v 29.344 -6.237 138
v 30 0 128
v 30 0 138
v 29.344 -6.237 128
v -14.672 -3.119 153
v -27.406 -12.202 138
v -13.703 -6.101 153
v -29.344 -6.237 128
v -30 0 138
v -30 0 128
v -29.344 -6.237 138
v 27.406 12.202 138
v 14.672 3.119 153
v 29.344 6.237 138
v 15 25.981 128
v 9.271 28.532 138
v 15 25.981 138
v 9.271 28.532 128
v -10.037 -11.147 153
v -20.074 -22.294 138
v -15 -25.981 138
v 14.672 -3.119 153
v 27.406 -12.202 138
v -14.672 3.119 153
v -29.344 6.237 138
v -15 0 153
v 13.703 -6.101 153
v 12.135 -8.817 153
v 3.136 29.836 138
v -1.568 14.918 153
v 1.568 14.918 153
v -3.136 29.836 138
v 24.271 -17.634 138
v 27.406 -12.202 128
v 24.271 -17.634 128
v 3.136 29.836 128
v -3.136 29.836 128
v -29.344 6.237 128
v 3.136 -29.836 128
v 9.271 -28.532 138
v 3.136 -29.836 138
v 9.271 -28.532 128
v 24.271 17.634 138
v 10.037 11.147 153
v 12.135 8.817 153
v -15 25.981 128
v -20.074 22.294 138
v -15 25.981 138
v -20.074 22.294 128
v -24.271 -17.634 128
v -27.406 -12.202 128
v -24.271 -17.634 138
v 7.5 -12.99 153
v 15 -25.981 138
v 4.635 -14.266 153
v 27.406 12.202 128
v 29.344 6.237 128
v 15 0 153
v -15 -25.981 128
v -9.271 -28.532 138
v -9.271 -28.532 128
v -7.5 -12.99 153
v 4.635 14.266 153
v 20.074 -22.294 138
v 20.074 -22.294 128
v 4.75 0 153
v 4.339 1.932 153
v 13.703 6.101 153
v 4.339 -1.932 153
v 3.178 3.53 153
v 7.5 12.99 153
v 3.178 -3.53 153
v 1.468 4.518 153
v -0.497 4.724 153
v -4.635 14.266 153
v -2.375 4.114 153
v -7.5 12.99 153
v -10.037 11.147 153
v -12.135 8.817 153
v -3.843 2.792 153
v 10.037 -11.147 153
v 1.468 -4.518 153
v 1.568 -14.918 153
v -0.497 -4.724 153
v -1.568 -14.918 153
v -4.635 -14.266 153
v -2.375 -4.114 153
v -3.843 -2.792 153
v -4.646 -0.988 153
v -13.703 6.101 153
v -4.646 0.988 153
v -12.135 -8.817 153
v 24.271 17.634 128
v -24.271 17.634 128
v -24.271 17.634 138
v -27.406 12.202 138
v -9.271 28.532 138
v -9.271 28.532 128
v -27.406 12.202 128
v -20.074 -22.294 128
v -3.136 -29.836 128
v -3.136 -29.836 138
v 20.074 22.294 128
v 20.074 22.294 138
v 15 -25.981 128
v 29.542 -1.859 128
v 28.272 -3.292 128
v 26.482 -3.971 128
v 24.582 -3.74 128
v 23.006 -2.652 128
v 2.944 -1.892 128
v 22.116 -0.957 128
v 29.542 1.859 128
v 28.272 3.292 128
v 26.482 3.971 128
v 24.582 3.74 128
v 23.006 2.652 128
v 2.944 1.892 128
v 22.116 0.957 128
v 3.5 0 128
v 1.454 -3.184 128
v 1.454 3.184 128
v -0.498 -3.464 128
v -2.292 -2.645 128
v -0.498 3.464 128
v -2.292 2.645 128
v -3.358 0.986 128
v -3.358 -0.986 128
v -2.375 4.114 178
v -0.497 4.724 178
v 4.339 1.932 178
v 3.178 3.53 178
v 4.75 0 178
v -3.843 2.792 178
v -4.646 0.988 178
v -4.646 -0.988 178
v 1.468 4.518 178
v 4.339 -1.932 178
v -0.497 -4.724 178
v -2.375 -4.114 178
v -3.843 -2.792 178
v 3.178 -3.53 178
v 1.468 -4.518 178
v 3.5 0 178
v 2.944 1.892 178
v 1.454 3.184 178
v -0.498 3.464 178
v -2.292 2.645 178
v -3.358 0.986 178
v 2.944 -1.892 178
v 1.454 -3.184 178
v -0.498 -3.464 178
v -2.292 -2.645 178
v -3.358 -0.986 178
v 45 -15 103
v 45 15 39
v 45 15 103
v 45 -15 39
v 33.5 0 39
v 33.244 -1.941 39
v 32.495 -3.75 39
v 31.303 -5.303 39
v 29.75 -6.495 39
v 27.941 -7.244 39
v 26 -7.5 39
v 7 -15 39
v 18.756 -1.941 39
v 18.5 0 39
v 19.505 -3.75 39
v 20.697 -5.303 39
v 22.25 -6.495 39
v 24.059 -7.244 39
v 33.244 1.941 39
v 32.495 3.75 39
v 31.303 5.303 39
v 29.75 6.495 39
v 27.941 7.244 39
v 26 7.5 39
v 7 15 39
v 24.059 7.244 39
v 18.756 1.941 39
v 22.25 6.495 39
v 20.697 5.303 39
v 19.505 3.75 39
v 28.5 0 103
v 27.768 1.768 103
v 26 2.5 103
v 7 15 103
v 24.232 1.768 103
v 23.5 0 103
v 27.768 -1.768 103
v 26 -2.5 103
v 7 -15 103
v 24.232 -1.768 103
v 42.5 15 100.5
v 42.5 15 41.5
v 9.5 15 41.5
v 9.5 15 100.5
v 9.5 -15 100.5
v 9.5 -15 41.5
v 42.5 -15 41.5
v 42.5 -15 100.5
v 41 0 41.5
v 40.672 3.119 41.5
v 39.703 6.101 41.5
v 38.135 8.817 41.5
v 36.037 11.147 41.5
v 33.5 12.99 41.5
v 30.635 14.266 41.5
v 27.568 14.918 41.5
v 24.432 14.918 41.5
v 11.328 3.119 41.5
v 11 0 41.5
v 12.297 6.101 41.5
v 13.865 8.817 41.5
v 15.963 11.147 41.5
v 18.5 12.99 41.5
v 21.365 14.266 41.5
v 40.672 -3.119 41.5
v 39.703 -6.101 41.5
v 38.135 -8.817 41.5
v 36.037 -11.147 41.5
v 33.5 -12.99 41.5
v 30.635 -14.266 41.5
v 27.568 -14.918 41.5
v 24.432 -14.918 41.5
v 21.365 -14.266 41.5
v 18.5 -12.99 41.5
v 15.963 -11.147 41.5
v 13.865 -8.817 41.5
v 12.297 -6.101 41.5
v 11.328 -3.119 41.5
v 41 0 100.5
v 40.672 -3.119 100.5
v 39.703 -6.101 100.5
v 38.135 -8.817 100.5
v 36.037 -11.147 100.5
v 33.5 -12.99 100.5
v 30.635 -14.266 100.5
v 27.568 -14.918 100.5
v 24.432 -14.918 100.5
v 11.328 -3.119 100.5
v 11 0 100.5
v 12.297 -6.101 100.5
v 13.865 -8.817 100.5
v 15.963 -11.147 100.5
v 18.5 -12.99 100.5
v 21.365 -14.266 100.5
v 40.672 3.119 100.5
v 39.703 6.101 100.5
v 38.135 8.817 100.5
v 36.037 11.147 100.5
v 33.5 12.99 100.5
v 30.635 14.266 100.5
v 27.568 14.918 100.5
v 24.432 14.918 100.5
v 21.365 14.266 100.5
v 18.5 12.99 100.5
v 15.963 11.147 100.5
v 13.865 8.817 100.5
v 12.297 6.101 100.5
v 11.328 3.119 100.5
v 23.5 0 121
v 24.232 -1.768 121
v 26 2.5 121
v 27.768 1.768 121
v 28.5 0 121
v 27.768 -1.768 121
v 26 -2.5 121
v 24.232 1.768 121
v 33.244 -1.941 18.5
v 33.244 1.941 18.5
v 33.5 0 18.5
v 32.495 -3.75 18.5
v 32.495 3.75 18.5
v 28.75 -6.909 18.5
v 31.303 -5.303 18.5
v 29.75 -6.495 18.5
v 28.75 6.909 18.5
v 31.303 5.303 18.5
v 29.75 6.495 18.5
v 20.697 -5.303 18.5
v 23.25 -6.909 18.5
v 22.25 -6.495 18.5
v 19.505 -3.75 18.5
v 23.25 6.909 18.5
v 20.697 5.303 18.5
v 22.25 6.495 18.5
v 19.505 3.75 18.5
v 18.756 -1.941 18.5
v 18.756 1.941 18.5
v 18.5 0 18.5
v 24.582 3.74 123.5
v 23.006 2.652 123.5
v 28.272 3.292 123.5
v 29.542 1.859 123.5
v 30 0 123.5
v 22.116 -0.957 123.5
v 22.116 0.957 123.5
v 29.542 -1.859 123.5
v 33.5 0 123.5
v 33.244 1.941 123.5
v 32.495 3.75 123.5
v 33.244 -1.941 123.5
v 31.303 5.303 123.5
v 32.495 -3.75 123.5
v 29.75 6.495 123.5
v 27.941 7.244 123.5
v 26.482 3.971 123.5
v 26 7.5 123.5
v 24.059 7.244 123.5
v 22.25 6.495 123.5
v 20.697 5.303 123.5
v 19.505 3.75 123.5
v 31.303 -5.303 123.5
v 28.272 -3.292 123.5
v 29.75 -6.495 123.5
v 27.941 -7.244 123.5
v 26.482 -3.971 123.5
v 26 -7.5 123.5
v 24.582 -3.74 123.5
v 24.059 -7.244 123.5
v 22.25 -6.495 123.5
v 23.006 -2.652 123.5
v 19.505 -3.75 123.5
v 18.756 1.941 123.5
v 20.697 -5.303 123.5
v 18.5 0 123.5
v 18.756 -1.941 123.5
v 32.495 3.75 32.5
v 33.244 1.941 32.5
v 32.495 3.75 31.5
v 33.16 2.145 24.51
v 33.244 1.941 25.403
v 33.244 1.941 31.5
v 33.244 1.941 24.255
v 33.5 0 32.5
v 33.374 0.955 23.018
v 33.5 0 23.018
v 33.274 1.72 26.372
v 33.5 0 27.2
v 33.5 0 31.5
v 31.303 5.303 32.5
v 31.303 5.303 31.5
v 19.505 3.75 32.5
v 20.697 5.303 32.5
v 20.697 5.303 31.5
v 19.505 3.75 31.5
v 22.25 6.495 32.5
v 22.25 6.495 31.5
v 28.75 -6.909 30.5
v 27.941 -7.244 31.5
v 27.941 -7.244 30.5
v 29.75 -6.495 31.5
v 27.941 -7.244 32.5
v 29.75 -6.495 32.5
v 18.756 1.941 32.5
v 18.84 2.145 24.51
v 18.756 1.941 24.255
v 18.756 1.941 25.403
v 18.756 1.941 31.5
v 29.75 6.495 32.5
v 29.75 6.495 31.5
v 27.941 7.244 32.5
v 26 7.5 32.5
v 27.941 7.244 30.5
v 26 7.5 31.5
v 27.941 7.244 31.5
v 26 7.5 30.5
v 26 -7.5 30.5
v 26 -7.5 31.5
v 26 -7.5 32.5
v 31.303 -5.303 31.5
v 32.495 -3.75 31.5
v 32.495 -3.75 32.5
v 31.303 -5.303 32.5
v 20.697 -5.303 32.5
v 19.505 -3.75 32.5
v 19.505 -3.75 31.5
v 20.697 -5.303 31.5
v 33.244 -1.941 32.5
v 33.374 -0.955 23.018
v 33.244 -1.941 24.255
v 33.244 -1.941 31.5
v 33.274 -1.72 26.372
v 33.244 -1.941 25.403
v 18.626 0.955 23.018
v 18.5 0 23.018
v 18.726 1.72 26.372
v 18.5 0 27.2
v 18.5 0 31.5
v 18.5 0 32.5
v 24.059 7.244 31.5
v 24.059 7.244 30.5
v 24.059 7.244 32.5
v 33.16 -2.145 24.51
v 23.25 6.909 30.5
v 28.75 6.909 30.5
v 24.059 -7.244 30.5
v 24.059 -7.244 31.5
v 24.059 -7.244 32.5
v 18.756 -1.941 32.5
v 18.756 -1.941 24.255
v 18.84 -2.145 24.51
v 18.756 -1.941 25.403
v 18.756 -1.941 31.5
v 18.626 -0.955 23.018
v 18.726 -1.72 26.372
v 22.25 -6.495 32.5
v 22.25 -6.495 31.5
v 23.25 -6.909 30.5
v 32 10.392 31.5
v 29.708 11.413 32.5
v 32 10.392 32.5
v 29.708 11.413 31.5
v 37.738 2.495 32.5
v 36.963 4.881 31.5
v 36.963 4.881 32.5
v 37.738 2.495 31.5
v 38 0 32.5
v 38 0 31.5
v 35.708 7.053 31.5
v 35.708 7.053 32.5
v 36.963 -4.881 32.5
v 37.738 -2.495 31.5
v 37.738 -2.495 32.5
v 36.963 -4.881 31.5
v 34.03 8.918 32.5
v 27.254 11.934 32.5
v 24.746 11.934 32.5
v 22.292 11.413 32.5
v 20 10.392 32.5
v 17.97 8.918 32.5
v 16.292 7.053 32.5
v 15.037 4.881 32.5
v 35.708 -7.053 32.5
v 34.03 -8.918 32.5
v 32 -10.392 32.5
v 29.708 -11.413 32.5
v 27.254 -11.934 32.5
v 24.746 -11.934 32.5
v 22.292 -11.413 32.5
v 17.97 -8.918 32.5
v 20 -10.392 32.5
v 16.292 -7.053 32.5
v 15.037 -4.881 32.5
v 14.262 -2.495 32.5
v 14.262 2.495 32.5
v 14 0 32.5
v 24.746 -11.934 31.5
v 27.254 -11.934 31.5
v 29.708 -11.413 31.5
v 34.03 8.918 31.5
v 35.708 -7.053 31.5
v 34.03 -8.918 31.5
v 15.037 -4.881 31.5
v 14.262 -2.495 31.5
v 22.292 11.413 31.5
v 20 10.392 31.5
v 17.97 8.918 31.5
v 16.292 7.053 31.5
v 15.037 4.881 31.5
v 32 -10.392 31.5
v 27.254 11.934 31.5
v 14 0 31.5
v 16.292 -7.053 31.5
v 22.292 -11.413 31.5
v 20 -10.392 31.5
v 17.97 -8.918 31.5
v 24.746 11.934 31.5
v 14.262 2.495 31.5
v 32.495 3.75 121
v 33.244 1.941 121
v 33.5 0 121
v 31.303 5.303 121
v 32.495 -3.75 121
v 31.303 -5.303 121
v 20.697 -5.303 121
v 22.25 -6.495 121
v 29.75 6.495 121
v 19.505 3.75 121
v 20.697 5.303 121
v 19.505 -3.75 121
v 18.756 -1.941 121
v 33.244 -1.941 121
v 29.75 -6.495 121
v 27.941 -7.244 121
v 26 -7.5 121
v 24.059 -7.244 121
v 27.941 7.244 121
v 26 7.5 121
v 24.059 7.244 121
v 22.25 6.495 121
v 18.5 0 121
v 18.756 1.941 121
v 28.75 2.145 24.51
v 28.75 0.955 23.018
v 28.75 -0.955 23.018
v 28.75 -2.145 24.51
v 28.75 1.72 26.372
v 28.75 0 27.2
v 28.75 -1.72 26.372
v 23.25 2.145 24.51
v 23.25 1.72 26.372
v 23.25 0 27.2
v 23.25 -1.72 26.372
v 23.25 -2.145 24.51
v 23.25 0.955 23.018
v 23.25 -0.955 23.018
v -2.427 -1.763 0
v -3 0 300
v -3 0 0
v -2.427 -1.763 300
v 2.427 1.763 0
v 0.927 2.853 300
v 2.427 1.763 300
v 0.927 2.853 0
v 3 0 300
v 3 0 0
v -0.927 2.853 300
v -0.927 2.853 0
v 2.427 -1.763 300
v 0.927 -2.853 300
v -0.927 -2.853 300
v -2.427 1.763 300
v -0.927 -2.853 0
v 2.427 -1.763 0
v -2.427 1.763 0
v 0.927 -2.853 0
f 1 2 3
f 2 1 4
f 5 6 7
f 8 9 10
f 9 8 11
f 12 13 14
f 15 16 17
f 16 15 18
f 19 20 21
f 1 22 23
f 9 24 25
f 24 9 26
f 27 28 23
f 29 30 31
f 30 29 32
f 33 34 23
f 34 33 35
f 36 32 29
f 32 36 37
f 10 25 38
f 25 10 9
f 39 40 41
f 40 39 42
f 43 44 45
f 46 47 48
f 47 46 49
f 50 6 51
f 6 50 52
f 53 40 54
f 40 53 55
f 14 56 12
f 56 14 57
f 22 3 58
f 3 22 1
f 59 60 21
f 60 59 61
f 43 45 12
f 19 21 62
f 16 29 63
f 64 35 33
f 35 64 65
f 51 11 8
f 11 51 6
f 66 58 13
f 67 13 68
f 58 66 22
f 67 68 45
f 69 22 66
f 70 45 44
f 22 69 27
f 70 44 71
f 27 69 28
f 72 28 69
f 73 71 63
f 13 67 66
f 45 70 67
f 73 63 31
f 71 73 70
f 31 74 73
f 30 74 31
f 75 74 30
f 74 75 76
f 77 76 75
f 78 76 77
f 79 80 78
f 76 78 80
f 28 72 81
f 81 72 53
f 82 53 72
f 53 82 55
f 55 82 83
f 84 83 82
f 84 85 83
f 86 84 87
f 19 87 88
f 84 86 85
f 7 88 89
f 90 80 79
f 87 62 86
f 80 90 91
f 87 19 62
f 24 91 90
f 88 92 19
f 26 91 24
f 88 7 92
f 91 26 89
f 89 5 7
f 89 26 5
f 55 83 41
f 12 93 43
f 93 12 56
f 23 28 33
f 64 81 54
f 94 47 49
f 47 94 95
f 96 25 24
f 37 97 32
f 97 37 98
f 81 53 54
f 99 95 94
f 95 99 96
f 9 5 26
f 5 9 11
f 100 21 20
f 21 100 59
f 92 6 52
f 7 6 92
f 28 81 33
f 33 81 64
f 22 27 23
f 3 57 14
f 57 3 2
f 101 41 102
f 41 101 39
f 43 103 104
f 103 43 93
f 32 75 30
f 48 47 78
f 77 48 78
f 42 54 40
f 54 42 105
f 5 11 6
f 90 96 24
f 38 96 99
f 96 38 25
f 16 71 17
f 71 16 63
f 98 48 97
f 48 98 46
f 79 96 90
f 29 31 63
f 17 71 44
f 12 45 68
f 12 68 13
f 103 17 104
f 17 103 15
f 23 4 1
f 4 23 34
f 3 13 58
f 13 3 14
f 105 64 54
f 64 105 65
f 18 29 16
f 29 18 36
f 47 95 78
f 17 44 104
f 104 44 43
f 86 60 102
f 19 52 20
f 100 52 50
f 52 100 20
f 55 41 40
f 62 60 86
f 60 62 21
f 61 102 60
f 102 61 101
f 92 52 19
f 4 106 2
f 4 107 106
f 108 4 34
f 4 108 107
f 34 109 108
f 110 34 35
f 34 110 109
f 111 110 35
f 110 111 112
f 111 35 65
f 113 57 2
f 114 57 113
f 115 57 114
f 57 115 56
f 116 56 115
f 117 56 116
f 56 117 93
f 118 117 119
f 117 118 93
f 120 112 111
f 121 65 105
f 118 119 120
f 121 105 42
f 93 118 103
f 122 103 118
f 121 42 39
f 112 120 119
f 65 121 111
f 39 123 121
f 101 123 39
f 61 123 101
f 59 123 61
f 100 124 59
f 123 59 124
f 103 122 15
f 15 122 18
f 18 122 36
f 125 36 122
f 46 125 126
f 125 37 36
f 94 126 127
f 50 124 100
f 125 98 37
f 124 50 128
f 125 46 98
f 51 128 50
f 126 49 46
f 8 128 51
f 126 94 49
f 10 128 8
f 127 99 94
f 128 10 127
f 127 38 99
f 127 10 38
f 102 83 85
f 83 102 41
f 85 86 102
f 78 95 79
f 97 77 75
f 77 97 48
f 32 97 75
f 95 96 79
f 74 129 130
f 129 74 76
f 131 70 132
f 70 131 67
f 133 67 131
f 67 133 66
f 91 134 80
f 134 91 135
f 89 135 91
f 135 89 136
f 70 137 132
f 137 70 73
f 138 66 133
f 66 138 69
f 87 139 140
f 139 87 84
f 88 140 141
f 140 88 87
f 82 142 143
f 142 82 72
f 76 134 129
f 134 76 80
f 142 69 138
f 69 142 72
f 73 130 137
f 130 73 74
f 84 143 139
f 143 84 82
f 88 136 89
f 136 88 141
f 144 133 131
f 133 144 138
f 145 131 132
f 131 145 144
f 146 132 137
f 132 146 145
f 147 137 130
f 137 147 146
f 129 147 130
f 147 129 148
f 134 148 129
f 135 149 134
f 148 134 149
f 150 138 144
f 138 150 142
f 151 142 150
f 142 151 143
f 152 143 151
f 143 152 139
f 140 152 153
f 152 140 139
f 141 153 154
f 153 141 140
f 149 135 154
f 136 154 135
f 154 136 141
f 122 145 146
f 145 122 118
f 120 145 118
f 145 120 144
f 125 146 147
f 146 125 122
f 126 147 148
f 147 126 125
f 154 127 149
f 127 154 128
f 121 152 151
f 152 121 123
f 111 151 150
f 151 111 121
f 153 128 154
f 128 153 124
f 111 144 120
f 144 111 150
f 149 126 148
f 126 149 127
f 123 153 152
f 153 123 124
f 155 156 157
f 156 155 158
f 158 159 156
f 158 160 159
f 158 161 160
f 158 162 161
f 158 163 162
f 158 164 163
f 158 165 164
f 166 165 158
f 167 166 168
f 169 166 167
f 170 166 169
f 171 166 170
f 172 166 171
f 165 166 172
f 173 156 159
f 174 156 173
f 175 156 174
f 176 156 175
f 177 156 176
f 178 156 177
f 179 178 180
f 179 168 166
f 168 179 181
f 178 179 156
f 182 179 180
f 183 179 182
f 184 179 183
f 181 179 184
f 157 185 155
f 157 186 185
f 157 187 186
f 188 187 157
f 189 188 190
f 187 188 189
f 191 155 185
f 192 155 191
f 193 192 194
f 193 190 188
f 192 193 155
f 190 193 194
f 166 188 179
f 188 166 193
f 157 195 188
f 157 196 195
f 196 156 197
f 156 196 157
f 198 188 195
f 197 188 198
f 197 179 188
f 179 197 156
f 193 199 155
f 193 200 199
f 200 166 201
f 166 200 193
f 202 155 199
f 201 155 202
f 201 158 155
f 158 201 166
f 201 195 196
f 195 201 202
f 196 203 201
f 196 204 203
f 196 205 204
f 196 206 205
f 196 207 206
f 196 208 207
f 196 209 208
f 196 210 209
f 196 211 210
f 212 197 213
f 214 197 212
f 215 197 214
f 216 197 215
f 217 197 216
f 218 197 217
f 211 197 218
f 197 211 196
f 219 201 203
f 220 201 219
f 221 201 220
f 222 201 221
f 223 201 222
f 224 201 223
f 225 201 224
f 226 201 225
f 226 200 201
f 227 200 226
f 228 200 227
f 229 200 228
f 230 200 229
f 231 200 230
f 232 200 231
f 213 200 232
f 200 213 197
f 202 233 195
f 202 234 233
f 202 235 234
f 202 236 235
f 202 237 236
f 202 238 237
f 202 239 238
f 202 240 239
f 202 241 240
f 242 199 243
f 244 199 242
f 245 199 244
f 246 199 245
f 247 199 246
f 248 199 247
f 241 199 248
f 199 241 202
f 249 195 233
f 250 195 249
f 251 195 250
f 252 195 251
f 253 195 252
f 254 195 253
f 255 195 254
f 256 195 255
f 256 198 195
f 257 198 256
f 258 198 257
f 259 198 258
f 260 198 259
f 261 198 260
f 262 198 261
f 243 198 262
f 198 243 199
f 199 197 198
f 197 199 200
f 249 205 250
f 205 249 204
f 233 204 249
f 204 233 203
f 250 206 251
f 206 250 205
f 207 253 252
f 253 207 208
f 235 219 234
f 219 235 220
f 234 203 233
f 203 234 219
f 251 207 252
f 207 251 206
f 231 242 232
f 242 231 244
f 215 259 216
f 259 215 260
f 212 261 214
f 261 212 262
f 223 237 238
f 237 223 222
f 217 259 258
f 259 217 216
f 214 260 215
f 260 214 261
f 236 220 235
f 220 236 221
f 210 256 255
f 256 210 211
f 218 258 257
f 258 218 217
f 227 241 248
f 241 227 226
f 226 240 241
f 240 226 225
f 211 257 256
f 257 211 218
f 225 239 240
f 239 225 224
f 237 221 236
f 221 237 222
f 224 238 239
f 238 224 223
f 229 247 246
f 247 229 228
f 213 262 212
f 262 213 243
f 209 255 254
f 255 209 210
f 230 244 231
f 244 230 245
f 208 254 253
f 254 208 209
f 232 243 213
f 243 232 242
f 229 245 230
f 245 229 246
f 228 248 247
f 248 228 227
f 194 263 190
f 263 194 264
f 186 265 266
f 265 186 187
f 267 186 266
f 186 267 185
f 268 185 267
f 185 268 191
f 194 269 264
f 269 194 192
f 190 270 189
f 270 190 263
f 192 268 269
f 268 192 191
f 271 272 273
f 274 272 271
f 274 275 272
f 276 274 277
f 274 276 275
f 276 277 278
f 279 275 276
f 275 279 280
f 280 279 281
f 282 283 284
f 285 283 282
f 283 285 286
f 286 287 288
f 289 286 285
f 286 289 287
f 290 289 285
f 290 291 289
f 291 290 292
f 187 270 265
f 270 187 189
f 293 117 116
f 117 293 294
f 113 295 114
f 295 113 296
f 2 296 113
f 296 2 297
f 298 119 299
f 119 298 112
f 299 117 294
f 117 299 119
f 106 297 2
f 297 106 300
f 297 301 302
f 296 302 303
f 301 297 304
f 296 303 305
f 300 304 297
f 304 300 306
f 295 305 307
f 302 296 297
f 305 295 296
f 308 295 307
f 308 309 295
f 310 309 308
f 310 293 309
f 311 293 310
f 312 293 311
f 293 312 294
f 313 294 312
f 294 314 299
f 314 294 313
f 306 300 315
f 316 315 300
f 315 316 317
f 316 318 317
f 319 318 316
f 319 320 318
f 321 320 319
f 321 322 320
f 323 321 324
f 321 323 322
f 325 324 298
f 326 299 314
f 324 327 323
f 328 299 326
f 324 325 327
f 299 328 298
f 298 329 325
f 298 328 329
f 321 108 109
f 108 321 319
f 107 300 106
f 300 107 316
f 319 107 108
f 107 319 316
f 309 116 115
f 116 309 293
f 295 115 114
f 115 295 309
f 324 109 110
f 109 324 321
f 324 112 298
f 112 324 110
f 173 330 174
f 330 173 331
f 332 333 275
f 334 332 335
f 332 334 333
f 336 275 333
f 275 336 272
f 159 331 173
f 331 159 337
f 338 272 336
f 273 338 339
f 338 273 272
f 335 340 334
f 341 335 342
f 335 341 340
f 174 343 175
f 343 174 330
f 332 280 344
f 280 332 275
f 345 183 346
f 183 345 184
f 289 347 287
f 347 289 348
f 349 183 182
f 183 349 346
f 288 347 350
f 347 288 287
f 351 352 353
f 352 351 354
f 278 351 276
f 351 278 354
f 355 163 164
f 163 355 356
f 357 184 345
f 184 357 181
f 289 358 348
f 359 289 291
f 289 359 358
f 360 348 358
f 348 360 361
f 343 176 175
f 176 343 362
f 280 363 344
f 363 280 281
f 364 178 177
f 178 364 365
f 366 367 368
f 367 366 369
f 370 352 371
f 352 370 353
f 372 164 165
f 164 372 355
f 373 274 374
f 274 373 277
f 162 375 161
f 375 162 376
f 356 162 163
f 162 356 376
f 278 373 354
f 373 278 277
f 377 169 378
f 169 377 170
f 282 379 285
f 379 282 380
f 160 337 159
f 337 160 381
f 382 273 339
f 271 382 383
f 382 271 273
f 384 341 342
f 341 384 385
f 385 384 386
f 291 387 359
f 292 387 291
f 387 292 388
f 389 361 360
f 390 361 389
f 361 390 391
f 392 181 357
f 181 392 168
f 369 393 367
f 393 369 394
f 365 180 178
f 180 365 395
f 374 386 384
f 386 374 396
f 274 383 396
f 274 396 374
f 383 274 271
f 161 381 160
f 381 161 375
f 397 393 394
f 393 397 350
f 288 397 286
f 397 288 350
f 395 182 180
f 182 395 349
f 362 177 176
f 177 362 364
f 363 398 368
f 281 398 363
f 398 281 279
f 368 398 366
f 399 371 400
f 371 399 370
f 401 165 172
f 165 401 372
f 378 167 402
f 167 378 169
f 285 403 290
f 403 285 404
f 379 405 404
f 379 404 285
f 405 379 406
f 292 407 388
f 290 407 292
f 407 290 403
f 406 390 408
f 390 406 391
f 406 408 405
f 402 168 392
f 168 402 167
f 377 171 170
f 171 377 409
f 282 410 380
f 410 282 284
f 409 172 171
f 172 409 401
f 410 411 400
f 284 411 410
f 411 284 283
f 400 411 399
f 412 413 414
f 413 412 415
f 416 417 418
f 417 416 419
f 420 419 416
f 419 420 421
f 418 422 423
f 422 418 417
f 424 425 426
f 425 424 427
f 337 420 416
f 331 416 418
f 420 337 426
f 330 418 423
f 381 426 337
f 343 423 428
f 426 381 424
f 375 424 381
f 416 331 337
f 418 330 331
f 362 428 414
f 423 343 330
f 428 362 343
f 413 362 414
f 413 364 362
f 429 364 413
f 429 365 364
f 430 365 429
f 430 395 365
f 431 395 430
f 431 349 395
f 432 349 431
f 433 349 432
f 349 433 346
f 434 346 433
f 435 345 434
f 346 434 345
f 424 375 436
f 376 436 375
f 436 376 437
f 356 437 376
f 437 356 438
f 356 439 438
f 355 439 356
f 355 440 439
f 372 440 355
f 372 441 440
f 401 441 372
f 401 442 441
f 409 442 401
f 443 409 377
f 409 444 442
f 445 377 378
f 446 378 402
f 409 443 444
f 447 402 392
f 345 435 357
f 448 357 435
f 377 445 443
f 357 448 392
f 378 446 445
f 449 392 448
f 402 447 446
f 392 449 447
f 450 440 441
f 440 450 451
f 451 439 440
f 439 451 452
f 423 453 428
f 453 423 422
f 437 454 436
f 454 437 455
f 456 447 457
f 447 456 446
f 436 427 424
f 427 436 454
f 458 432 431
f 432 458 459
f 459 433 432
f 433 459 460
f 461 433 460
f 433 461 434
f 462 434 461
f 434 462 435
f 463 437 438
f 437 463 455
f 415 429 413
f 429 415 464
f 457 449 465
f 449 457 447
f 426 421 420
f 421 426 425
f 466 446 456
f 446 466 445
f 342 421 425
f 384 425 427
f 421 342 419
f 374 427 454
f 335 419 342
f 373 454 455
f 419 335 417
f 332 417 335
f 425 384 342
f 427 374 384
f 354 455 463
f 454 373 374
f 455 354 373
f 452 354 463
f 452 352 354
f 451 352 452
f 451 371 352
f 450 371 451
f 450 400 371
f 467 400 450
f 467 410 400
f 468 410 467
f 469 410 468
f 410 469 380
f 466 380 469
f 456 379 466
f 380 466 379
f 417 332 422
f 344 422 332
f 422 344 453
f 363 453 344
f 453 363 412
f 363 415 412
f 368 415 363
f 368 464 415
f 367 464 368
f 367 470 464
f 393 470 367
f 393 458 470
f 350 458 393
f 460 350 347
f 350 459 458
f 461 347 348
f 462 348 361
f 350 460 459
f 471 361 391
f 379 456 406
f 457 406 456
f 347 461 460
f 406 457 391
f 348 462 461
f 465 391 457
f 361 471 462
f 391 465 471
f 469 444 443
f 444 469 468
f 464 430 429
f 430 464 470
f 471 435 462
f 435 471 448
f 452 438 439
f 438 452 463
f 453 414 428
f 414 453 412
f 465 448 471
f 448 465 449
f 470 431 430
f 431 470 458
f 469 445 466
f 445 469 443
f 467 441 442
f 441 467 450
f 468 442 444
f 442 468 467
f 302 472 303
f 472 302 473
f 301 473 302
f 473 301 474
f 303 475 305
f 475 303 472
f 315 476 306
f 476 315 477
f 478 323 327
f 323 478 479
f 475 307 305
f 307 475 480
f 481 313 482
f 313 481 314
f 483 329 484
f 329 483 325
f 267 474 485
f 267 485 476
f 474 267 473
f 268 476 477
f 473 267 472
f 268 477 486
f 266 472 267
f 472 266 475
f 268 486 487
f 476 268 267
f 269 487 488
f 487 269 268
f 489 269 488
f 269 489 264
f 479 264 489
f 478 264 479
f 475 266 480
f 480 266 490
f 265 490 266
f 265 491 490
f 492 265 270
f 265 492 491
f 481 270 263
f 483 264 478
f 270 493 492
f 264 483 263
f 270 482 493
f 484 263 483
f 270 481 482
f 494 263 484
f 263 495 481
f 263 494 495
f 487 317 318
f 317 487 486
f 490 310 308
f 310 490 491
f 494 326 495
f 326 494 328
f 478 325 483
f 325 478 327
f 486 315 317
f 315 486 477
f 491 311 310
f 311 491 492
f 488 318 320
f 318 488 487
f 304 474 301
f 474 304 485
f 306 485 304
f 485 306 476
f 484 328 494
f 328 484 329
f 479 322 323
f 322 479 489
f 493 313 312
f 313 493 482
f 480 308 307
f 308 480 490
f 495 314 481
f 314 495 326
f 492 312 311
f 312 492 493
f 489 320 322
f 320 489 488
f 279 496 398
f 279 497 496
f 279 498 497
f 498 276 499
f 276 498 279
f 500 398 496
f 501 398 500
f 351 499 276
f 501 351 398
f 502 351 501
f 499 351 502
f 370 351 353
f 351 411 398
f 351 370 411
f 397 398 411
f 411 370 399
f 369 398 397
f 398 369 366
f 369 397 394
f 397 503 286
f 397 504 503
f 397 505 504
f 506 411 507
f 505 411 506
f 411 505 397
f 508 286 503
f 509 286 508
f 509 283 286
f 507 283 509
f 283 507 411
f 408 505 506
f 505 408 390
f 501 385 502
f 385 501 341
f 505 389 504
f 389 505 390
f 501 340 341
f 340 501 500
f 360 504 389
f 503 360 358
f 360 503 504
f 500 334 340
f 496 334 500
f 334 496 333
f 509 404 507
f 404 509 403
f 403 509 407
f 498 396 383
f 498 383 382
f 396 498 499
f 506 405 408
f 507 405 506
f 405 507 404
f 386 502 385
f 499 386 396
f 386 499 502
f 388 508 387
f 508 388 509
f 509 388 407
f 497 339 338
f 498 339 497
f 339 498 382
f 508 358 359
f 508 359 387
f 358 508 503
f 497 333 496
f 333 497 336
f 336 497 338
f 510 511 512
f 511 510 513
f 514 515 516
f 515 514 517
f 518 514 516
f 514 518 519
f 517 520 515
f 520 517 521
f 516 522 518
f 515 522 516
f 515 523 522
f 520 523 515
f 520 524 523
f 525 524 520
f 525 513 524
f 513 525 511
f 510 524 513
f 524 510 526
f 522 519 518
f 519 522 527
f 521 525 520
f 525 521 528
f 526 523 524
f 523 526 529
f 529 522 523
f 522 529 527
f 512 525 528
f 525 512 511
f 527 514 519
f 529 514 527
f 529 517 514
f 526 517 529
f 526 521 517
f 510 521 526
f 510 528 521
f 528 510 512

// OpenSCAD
axis();
translate([0,0,128]) btmClutch();

translate([0,0,111]) mirror([0,0,1]){
    translate([26,0,40]){
        color("silver") difference(){
            cube([38,30,64],center=true);
            cube([33,32,59],center=true);
        }
        color("blue") translate([0,0,-29.5]) cylinder(r=15,h=59);
    }
    translate([0,0,-18]) difference(){
        union(){
            translate([26,0,0.5]){
                color("lightgray"){
                    cylinder(r=2.5,h=110);
                    cylinder(r=4,h=5);
                    translate([0,0,26]) cylinder(r=7.5,h=84);
                    translate([0,0,96]) cylinder(r=12,h=1);
                }
            }
            color("black") translate([26,0,5.5]) cylinder(r=7.5,h=2.5);
        }
        translate([26,0,110]) cube([5.5,15,23],center=true);
        translate([15,0,104]) rotate([0,90,0]) cylinder(r=2.2,h=20);
    }
}

module btmClutch(){
    color("gray") difference(){     //  printed lifting flange
        hull(){
            cylinder(r=15,h=25);
            cylinder(r=30,h=10);
        }
        translate([0,0,-1]) cylinder(r=4.75,h=27);
    }
    color("white") difference(){     //  9.5mm threaded tube
        cylinder(r=4.75,h=50);
        translate([0,0,-1]) cylinder(r=3.5,h=52);
    }
}

module axis() color("lightgray") cylinder(r=3,h=300);
